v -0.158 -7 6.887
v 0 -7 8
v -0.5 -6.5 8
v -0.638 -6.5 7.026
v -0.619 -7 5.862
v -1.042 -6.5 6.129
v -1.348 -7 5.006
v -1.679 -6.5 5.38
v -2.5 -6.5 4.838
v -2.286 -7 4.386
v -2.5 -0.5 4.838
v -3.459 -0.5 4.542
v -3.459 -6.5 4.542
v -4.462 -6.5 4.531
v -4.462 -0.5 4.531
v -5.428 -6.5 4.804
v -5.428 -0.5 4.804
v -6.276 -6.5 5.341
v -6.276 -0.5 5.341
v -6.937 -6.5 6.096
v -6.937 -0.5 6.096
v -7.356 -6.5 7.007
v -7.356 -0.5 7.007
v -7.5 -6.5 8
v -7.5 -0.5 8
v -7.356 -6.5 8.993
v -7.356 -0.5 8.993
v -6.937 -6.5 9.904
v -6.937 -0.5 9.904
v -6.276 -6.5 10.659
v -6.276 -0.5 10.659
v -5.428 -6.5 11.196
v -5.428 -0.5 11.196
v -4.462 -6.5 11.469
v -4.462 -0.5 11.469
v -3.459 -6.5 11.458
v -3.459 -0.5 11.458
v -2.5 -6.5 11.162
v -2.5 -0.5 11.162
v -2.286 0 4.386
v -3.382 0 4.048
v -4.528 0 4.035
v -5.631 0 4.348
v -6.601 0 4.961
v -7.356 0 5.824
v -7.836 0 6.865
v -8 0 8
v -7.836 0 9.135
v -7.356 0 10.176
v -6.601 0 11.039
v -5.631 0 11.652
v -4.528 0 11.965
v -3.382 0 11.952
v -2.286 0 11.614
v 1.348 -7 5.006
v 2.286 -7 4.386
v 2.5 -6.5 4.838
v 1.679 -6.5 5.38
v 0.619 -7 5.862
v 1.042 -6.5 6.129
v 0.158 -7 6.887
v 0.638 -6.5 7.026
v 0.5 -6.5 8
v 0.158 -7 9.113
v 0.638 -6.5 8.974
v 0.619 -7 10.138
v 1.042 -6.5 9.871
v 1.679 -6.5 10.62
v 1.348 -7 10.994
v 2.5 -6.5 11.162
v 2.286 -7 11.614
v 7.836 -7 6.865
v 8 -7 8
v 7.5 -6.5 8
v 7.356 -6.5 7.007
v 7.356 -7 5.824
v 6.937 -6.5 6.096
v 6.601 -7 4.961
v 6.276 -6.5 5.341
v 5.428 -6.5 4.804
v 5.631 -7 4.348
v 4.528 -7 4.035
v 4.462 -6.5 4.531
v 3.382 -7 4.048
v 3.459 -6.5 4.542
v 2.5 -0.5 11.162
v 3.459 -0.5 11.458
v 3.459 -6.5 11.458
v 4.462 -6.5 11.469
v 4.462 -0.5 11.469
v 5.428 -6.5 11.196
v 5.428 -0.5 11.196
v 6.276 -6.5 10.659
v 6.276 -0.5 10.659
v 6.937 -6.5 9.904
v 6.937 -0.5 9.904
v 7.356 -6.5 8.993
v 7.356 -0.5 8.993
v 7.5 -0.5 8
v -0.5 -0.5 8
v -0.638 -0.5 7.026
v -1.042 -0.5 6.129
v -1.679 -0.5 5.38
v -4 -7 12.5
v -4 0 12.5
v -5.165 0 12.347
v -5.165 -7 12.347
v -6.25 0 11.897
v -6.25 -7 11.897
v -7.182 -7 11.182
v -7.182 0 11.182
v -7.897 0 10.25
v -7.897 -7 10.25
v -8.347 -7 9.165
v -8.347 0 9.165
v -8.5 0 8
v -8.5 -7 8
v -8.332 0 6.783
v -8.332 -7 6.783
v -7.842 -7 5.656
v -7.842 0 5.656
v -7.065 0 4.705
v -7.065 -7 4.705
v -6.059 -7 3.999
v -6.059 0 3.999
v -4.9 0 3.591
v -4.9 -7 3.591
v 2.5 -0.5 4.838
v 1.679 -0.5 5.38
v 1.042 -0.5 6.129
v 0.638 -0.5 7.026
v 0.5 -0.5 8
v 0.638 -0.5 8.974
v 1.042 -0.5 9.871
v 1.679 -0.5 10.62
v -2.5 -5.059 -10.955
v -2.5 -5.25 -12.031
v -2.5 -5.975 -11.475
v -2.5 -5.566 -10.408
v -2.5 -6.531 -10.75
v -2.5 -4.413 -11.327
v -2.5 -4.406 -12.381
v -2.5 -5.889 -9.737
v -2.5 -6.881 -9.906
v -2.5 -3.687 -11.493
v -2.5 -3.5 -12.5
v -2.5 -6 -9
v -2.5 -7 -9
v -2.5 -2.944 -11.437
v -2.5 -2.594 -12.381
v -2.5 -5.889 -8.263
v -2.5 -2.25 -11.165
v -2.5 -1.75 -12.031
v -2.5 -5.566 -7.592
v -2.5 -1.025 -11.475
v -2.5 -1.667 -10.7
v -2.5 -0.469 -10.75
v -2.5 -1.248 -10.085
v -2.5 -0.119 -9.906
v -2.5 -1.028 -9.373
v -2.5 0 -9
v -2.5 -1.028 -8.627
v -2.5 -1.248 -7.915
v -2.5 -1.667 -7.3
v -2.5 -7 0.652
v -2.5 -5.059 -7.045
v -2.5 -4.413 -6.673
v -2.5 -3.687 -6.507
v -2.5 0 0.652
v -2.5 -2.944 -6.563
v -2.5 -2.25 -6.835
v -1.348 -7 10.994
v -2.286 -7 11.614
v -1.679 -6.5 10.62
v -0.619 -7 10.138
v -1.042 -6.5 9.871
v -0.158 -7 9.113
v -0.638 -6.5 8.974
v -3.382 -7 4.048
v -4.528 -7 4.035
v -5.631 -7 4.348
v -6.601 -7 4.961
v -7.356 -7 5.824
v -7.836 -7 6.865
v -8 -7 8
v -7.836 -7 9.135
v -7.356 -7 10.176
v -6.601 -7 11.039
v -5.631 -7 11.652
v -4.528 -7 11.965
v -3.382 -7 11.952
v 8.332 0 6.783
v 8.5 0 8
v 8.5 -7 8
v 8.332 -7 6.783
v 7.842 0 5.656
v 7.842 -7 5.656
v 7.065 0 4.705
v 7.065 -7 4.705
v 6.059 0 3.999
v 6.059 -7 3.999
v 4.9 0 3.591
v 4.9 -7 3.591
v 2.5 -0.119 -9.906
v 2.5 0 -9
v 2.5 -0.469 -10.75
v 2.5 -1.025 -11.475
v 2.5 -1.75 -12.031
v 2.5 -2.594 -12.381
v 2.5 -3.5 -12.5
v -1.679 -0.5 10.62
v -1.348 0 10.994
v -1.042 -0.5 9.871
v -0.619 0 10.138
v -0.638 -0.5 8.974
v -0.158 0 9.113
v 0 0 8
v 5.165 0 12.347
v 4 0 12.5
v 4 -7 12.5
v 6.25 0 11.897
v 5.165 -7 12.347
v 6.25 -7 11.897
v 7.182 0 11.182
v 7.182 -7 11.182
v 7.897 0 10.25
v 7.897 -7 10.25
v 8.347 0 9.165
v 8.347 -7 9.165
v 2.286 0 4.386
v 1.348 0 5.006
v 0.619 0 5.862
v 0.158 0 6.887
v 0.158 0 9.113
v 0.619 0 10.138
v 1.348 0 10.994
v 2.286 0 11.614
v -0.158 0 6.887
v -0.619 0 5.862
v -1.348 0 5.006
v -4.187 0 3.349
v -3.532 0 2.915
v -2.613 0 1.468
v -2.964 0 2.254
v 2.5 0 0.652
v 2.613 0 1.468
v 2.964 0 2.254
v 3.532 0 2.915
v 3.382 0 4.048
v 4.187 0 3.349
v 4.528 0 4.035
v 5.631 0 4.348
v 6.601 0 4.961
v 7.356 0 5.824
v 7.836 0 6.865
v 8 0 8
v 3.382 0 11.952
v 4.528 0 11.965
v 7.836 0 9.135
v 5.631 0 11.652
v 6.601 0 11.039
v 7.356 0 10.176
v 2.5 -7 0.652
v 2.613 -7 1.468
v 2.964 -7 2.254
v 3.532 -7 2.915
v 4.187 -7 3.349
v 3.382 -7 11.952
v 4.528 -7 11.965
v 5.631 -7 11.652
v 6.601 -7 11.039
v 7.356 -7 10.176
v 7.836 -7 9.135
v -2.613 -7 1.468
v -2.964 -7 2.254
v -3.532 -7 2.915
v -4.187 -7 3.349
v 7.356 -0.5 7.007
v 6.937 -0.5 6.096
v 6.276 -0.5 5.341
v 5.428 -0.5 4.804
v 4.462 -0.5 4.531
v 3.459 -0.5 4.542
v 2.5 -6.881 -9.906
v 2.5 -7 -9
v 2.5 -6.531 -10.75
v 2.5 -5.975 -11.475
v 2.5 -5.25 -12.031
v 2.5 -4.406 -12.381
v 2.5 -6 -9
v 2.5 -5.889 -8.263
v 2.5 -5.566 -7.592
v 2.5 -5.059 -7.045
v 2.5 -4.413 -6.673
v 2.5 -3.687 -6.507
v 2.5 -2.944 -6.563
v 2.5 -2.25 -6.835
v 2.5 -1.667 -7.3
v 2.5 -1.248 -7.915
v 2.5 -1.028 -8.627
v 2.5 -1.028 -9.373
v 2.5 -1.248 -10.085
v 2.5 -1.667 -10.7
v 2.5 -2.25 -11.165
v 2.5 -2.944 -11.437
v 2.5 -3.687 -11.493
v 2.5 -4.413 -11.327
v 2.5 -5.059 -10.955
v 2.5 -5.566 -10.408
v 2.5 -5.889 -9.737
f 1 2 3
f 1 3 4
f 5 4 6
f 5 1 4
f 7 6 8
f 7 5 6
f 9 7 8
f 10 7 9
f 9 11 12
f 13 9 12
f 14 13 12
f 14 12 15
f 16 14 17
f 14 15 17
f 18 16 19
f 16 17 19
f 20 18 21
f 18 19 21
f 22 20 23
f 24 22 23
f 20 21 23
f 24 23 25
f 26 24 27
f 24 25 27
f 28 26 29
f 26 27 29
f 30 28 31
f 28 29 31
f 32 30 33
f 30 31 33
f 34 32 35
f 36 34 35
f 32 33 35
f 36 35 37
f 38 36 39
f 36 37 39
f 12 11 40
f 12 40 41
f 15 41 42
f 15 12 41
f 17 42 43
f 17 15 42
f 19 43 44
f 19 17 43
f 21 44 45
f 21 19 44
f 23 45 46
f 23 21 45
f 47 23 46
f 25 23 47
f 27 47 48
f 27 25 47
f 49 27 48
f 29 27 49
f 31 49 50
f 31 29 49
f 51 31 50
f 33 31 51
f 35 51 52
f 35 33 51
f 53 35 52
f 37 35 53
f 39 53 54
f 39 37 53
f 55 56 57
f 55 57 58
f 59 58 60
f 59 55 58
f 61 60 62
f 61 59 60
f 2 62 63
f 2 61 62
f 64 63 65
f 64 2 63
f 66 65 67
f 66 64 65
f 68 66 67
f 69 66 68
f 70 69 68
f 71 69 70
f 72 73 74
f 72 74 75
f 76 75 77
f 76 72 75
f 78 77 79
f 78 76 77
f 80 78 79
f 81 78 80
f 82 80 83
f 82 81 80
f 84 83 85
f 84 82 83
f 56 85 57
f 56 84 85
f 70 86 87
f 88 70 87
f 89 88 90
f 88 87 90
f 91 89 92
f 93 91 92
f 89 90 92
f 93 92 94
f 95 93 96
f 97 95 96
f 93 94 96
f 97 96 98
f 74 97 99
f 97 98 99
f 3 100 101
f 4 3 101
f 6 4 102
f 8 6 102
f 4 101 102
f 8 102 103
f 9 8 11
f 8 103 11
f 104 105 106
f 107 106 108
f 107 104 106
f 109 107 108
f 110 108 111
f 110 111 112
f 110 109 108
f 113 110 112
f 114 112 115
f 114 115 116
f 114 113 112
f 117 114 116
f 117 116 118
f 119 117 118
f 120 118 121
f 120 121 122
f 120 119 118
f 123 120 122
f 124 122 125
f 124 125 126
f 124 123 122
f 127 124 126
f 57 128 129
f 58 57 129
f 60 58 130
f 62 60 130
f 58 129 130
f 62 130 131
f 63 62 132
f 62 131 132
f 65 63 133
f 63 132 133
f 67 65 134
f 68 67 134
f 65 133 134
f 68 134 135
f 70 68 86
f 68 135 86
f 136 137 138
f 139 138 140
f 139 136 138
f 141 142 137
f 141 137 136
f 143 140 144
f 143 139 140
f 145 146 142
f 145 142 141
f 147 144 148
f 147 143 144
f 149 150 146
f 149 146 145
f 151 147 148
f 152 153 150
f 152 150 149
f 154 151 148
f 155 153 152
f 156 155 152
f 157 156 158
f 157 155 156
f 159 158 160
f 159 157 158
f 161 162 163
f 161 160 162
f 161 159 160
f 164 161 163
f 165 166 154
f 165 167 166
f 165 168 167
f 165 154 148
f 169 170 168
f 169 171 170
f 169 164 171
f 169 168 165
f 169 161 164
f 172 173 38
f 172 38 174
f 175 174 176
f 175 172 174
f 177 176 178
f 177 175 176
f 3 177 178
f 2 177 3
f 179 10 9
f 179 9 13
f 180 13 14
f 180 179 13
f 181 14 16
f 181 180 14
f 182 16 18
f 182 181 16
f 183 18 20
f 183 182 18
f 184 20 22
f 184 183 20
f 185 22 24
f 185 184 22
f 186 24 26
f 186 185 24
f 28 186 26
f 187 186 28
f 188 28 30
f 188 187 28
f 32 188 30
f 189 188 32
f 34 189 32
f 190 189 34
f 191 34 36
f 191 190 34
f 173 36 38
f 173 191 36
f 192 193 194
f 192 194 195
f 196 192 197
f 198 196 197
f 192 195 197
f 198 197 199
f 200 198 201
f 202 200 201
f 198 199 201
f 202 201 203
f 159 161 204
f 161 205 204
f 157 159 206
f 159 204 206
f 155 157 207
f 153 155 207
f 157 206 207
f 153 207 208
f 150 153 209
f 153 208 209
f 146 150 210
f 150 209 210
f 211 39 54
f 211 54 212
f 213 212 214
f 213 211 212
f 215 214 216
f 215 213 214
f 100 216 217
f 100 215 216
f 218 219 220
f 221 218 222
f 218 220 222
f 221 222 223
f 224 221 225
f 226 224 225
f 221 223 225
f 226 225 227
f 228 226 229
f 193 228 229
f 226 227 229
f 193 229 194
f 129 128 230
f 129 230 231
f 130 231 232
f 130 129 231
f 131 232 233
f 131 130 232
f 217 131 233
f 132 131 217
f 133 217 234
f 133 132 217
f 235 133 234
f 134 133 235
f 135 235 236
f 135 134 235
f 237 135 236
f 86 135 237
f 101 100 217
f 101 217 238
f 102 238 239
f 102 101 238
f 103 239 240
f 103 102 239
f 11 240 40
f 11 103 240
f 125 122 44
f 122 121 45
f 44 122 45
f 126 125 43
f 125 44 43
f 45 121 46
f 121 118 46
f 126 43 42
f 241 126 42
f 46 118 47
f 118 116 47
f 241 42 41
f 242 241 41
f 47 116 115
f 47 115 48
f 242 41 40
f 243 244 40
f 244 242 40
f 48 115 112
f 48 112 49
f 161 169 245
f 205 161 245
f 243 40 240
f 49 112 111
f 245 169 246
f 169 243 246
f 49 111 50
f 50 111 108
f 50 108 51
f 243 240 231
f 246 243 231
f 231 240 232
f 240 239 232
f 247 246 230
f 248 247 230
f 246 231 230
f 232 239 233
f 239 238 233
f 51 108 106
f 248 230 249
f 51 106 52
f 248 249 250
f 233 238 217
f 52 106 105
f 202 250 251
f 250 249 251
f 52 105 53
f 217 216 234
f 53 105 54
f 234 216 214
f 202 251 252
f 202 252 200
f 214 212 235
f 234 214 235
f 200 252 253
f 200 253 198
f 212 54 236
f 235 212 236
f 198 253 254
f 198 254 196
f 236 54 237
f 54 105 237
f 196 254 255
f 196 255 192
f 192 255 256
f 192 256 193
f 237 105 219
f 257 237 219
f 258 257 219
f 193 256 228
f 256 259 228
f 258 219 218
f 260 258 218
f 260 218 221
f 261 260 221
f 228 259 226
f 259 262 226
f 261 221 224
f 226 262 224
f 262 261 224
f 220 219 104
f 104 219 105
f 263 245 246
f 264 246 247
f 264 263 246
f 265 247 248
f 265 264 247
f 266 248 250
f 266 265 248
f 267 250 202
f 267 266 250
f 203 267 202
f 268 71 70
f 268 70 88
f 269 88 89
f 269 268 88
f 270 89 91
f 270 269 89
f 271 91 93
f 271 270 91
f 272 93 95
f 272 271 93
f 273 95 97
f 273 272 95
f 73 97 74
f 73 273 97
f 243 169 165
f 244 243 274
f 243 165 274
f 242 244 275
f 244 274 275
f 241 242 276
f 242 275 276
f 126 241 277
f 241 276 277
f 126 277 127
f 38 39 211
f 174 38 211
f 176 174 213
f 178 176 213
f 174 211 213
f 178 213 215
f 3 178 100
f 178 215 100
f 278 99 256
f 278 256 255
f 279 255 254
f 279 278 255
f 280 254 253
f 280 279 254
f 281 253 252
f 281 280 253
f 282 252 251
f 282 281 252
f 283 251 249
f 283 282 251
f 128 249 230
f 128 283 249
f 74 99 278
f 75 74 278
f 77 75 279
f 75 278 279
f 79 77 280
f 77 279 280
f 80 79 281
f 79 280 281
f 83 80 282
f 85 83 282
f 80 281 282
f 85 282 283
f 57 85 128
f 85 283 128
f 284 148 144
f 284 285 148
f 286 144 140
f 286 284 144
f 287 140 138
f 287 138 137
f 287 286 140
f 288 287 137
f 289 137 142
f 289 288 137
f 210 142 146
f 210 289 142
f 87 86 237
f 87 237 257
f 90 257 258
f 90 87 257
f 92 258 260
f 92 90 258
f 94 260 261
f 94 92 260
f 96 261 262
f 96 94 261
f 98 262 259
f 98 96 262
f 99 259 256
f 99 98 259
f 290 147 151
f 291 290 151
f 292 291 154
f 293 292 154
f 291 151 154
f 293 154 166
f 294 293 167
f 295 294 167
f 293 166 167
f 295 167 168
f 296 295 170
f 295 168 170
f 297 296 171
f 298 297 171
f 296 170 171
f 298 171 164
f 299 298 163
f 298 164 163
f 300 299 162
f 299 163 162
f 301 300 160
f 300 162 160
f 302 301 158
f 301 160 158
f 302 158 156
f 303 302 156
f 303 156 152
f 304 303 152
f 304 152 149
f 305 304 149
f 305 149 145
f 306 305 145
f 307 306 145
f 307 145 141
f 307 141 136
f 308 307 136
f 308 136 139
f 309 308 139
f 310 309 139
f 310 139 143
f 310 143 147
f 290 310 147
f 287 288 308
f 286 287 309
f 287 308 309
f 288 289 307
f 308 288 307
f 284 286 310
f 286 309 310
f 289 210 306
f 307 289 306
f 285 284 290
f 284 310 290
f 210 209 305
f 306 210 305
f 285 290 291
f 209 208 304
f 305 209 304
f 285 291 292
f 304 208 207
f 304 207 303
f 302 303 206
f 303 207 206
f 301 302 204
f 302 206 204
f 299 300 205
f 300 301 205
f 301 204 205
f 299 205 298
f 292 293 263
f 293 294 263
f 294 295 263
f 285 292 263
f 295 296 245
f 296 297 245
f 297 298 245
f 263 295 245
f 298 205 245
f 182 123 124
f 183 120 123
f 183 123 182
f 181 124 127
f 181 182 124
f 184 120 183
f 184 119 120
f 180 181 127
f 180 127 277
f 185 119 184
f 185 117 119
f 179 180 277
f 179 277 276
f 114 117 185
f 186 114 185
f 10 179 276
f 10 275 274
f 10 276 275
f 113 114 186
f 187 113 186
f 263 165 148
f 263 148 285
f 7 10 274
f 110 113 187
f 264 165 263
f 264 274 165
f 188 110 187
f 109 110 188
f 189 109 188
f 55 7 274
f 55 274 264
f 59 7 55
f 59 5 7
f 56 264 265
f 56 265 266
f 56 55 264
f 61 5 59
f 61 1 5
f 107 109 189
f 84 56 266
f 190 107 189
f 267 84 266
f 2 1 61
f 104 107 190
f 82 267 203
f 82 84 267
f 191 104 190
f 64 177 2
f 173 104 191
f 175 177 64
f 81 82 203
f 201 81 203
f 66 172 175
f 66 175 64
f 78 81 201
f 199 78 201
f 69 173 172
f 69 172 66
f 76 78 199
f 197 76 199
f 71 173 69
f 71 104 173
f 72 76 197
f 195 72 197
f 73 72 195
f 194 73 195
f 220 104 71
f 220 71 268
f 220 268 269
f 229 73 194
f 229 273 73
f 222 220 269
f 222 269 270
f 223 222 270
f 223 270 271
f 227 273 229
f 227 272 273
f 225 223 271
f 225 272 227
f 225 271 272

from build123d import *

# Parameters (mm, degrees)
F0_W     = 5
F0_H     = 16
F1_DEPTH = 7
F3_D     = 5
F4_R     = 4.49999
F5_R     = 3.49999
F6_R     = 3
F7_SIZE  = 0.49999


# Not quite as in the source:
# - a fillet or chamfer is up to 0.001 mm smaller than in the source, because OpenCascade refuses the exact size


with BuildPart() as f1:
    # F0 (on Front) → F1 (new body)
    with BuildSketch(Plane.XZ):
        with BuildLine():
            Line((8.5, 12.5), (2.5, 12.5))
            Line((2.5, 12.5), (2.5, 11.1622776602))
            ThreePointArc((2.5, 11.1622776602), (5.8708286934, 10.9580398915), (7.5, 8))
            ThreePointArc((7.5, 8), (5.8708286934, 5.0419601085), (2.5, 4.8377223398))
            Line((2.5, 4.8377223398), (2.5, 3.5))
            Line((2.5, 3.5), (8.5, 3.5))
            Line((8.5, 3.5), (8.5, 12.5))
        make_face()
        with BuildLine():
            Line((-2.5, 11.1622776602), (-2.5, 12.5))
            Line((-2.5, 12.5), (-8.5, 12.5))
            Line((-8.5, 12.5), (-8.5, 3.5))
            Line((-8.5, 3.5), (-2.5, 3.5))
            Line((-2.5, 3.5), (-2.5, 4.8377223398))
            ThreePointArc((-2.5, 4.8377223398), (-7.5, 8), (-2.5, 11.1622776602))
        make_face()
        with BuildLine():
            Line((2.5, 11.1622776602), (2.5, 12.5))
            Line((2.5, 12.5), (-2.5, 12.5))
            Line((-2.5, 12.5), (-2.5, 11.1622776602))
            ThreePointArc((-2.5, 11.1622776602), (-1.0419601085, 9.8708286934), (-0.5, 8))
            ThreePointArc((-0.5, 8), (-1.0419601085, 6.1291713066), (-2.5, 4.8377223398))
            Line((-2.5, 4.8377223398), (-2.5, 3.5))
            Line((-2.5, 3.5), (2.5, 3.5))
            Line((2.5, 3.5), (2.5, 4.8377223398))
            ThreePointArc((2.5, 4.8377223398), (0.5, 8), (2.5, 11.1622776602))
        make_face()
        with Locations((0, -4.5)):
            Rectangle(F0_W, F0_H)
    extrude(amount=F1_DEPTH)

    # F3 (through all)
    with Locations(Plane.YZ.offset(2.5)):
        with Locations((-3.5, -9)):
            Hole(F3_D / 2)

    # F4 (radius 4.5 in the source; OpenCascade refuses exactly that, so slightly less here)
    f4_edges = [f1.edges().sort_by_distance(p)[0] for p in [
        (8.5, -3.5, 12.5),
        (-8.5, -3.5, 12.5),
        (8.5, -3.5, 3.5),
        (-8.5, -3.5, 3.5),
    ]]
    fillet(f4_edges, radius=F4_R)

    # F5 (radius 3.5 in the source; OpenCascade refuses exactly that, so slightly less here)
    f5_edges = [f1.edges().sort_by_distance(p)[0] for p in [
        (0, 0, -12.5),
        (0, -7, -12.5),
    ]]
    fillet(f5_edges, radius=F5_R)

    # F6
    f6_edges = [f1.edges().sort_by_distance(p)[0] for p in [
        (2.5, -3.5, 3.5),
        (-2.5, -3.5, 3.5),
    ]]
    fillet(f6_edges, radius=F6_R)

    # F7 (size 0.5 in the source; OpenCascade refuses exactly that, so slightly less here)
    f7_edges = [f1.edges().sort_by_distance(p)[0] for p in [
        (-7.5, -7, 8),
        (5.5, -7, 11.162278),
        (-7.5, 0, 8),
        (5.5, 0, 11.162278),
    ]]
    chamfer(f7_edges, length=F7_SIZE)


solid = f1.part
